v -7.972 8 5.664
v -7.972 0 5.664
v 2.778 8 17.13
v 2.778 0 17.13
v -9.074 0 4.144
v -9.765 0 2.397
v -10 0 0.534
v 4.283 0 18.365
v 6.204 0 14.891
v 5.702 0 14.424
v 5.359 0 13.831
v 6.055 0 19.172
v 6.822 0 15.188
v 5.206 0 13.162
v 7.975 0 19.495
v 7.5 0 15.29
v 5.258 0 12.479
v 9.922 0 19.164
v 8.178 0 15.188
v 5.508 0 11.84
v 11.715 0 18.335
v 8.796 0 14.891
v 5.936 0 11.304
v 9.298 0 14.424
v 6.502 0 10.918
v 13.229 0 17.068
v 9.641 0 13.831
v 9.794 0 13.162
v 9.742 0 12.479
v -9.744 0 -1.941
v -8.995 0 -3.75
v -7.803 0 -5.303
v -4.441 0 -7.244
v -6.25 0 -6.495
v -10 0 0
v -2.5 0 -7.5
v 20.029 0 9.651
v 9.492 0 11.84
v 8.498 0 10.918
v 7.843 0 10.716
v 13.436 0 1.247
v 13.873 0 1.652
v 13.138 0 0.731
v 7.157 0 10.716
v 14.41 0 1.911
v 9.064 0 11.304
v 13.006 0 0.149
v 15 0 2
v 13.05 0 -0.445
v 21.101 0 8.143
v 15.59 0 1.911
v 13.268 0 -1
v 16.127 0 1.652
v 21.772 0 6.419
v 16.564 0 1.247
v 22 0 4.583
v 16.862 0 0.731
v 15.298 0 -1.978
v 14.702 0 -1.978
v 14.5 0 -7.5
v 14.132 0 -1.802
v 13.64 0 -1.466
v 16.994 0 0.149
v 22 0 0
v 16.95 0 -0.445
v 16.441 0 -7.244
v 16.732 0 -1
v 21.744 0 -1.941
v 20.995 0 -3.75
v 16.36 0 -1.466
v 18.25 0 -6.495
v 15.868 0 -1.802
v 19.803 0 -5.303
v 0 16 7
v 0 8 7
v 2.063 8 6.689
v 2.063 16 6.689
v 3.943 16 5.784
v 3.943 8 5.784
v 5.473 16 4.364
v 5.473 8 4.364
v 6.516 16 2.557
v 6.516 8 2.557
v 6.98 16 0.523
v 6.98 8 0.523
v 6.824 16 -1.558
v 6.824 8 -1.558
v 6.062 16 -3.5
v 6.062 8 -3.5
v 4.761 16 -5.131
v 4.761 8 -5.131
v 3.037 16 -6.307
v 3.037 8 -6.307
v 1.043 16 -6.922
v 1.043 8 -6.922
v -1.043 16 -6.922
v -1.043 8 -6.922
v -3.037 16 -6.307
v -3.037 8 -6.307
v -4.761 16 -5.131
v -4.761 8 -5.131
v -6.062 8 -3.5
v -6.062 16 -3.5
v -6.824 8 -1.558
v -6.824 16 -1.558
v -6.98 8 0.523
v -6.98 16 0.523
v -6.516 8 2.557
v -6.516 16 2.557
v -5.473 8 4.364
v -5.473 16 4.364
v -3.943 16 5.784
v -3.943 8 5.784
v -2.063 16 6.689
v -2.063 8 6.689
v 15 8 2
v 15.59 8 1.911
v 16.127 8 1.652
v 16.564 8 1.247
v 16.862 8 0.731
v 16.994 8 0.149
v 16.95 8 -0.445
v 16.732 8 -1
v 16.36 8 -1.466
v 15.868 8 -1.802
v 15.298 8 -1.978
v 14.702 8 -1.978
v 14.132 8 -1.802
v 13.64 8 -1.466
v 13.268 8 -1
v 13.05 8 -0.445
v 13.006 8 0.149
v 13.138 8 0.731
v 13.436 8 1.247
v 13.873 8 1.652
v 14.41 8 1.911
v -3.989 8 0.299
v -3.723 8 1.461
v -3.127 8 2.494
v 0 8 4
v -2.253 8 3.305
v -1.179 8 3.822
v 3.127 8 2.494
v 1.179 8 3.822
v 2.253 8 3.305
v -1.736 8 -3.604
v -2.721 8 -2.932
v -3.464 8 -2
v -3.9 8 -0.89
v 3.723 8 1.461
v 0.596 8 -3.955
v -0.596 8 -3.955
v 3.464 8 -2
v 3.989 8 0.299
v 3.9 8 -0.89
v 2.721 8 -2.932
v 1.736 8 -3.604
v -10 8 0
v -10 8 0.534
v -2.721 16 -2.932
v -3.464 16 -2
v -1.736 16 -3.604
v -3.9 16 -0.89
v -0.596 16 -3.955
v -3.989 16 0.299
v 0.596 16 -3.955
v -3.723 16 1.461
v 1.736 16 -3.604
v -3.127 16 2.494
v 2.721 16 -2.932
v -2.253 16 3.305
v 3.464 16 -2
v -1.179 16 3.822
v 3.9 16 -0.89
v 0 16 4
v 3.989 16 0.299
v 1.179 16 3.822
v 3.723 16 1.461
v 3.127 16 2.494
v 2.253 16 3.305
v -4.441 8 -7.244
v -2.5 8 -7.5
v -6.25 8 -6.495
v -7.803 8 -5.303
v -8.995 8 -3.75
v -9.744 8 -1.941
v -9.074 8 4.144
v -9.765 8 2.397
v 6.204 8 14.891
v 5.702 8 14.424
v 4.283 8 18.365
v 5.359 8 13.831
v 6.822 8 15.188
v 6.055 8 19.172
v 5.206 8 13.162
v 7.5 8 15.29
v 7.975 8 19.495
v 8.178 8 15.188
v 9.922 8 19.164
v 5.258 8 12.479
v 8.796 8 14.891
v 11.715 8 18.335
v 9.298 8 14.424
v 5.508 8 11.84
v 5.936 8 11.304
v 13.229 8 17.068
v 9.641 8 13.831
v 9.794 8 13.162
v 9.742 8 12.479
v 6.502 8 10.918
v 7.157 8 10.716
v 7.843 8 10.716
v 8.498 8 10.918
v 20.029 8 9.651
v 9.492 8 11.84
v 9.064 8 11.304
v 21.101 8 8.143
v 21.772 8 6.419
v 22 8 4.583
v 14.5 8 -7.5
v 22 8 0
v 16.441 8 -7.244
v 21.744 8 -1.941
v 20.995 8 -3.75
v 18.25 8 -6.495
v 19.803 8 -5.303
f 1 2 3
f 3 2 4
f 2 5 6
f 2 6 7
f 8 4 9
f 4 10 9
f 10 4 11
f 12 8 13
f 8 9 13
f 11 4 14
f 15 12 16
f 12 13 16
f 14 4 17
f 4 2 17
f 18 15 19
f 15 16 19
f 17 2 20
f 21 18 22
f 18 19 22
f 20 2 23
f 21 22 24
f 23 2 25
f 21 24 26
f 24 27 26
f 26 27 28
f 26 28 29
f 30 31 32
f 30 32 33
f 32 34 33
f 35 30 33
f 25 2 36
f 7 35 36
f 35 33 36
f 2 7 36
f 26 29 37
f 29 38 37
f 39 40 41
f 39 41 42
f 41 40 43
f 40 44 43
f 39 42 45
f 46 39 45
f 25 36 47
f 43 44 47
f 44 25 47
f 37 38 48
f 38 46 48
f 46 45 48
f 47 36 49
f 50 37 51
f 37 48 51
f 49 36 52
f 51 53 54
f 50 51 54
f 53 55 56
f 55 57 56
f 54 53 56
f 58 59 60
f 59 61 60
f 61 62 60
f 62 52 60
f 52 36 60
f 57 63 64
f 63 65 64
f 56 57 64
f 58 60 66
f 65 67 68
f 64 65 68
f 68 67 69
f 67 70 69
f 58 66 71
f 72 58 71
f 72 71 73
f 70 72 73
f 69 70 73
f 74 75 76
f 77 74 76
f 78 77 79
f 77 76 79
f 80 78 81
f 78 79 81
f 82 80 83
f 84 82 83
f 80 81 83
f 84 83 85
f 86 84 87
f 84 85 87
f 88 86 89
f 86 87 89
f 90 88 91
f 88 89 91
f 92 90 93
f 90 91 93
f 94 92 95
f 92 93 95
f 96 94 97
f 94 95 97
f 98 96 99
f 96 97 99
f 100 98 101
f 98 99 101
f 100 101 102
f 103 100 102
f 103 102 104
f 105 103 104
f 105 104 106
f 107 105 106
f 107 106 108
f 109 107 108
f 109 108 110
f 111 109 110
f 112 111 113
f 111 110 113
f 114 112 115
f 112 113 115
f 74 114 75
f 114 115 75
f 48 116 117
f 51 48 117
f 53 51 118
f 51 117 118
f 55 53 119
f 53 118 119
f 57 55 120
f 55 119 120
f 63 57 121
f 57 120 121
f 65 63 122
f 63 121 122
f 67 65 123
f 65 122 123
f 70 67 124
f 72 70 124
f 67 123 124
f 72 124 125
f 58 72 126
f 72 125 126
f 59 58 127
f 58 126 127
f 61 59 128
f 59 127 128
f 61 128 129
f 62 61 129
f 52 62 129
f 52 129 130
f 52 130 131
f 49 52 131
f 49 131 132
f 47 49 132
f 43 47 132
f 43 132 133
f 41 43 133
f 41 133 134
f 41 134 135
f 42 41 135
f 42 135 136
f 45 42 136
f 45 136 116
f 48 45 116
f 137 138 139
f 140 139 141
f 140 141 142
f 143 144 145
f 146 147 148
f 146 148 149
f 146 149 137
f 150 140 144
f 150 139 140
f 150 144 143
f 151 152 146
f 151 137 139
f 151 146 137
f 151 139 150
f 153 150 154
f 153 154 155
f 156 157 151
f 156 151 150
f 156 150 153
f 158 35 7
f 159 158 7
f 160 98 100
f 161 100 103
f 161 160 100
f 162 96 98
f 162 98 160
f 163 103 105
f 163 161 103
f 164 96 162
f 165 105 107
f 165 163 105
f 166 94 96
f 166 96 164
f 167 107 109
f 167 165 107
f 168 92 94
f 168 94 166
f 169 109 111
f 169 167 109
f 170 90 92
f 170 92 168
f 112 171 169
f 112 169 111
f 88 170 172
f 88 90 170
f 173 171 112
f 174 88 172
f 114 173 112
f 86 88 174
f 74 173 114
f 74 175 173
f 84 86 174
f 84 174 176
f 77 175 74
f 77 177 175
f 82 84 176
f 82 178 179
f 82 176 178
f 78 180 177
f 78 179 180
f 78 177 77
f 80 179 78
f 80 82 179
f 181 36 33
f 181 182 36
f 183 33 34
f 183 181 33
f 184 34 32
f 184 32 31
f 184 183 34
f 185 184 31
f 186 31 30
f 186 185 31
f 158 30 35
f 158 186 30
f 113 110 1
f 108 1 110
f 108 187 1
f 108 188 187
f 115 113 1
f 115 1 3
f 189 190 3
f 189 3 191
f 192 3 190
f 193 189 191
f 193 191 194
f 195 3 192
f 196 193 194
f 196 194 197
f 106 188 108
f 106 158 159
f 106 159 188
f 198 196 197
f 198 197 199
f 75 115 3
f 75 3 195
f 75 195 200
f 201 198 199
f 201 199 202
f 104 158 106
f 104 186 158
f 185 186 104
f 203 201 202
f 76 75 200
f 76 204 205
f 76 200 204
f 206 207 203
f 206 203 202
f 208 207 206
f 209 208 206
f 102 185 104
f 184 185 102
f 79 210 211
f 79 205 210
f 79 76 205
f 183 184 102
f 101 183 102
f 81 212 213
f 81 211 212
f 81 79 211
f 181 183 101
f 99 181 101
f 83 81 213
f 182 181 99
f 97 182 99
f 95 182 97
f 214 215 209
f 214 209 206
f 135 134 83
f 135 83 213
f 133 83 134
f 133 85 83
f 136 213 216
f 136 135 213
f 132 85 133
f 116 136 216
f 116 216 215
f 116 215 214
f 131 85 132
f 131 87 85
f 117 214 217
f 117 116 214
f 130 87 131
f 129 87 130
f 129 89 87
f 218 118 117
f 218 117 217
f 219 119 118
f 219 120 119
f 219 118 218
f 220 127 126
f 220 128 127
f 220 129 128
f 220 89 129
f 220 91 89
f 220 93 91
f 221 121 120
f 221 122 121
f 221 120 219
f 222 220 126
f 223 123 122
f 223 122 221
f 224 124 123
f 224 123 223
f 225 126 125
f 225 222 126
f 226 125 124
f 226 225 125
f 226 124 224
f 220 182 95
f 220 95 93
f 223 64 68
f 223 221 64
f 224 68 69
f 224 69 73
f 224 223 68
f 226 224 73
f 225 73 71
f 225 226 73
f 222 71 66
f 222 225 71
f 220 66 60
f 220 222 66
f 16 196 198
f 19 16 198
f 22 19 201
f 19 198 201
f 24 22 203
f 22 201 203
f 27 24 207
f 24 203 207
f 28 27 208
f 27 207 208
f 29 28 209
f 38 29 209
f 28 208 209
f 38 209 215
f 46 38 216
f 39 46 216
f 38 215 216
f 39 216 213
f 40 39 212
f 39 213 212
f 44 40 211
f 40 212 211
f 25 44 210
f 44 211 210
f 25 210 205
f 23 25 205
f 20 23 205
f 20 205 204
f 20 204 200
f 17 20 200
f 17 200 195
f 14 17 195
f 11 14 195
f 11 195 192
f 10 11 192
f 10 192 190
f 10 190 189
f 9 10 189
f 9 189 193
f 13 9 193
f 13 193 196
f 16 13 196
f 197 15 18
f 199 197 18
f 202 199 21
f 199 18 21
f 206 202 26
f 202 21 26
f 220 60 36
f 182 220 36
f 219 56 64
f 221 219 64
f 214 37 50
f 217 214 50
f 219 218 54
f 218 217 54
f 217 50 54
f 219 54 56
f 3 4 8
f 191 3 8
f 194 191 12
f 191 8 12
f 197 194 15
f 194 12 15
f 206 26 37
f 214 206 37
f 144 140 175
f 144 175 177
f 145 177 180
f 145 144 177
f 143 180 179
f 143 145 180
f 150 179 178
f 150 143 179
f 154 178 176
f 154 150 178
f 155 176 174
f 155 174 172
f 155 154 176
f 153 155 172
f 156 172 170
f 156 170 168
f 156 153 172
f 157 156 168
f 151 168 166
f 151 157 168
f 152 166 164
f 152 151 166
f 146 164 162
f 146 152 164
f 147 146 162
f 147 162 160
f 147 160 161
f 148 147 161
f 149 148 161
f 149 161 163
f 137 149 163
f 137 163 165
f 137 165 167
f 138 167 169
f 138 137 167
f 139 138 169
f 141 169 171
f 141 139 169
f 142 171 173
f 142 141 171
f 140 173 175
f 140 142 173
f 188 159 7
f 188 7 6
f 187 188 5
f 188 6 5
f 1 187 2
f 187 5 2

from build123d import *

# Parameters (mm, degrees)
BOSS_EXTRU_1_DEPTH      = 8
CONG_1_R                = 7.5
ENL_V_MAT_EXTRU_1_REACH = 32.467
ESQUISSE2_R             = 2
ESQUISSE2_R_2           = 2.3
ESQUISSE3_R             = 7
ESQUISSE3_R_2           = 4
BOSS_EXTRU_2_DEPTH      = 8
CONG_2_R                = 7.5


with BuildPart() as part:
    # Esquisse1 → Boss.-Extru.1 (new body)
    with BuildSketch(Plane(origin=(0, 0, 0), x_dir=(1, 0, 0), z_dir=(0, 1, 0))):
        Polygon((-10, -3.5), (5, -19.5), (11, -19.5), (22, -7.5), (22, 7.5), (-10, 7.5), align=None)
    extrude(amount=BOSS_EXTRU_1_DEPTH)

    # Congé1
    cong_1_edges = [part.edges().sort_by_distance(p)[0] for p in [
        (-10, 4, -7.5),
        (22, 4, -7.5),
    ]]
    fillet(cong_1_edges, radius=CONG_1_R)

    # Esquisse2 → Enlèv. mat.-Extru.1 (cut, up to next)
    with BuildSketch(Plane(origin=(0, 8, 0), x_dir=(1, 0, 0), z_dir=(0, 1, 0)), mode=Mode.PRIVATE) as enl_v_mat_extru_1_sk1:
        with Locations(Location((15, 0, 0), (0, 0, 270))):
            Circle(ESQUISSE2_R)
    enl_v_mat_extru_1_tool1 = extrude(enl_v_mat_extru_1_sk1.sketch, amount=-ENL_V_MAT_EXTRU_1_REACH, mode=Mode.PRIVATE) & part.part
    # Esquisse2 → Enlèv. mat.-Extru.1 (cut, up to next)
    with BuildSketch(Plane(origin=(0, 8, 0), x_dir=(1, 0, 0), z_dir=(0, 1, 0)), mode=Mode.PRIVATE) as enl_v_mat_extru_1_sk2:
        with Locations(Location((7.5, -12.990381057, 0), (0, 0, 270))):
            Circle(ESQUISSE2_R_2)
    enl_v_mat_extru_1_tool2 = extrude(enl_v_mat_extru_1_sk2.sketch, amount=-ENL_V_MAT_EXTRU_1_REACH, mode=Mode.PRIVATE) & part.part
    add(enl_v_mat_extru_1_tool1.solids().sort_by_distance((15, 8, 0))[0], mode=Mode.SUBTRACT)
    add(enl_v_mat_extru_1_tool2.solids().sort_by_distance((7.5, 8, 12.990381))[0], mode=Mode.SUBTRACT)

    # Esquisse3 → Boss.-Extru.2 (add)
    with BuildSketch(Plane(origin=(0, 8, 0), x_dir=(1, 0, 0), z_dir=(0, 1, 0))):
        with Locations(Location((0, 0, 0), (0, 0, 270))):
            Circle(ESQUISSE3_R)
        with Locations(Location((0, 0, 0), (0, 0, 270))):
            Circle(ESQUISSE3_R_2, mode=Mode.SUBTRACT)
    extrude(amount=BOSS_EXTRU_2_DEPTH)

    # Congé2
    # the kernel refuses this fillet: 7.5 mm, written as the material it takes off along each edge
    with BuildSketch(Plane(origin=(22, -7.293444198, 7.5), x_dir=(-0.6757246285173467, 0, 0.7371541402007411), z_dir=(0, 1, 0))) as cong_2_piece_1:
        with BuildLine():
            CenterArc((CONG_2_R * 0.388983690555, -CONG_2_R), CONG_2_R, 90, 42.510447078)
            Line((-CONG_2_R * 0.286740937963, -CONG_2_R * 0.262845859799), (0, 0))
            Line((0, 0), (CONG_2_R * 0.388983690555, 0))
        make_face()
    extrude(amount=22.586888396, mode=Mode.SUBTRACT)
    with BuildSketch(Plane(origin=(11, -8.248157181, 19.5), x_dir=(-1, 0, 0), z_dir=(0, 1, 0))) as cong_2_piece_2:
        with BuildLine():
            CenterArc((CONG_2_R * 0.439901716342, -CONG_2_R), CONG_2_R, 90, 47.489552922)
            Line((-CONG_2_R * 0.297252423859, -CONG_2_R * 0.324275371483), (0, 0))
            Line((0, 0), (CONG_2_R * 0.439901716342, 0))
        make_face()
    extrude(amount=24.496314363, mode=Mode.SUBTRACT)
    with BuildSketch(Plane(origin=(5, -8.123100234, 19.5), x_dir=(-0.6839411288813303, 0, -0.7295372041400847), z_dir=(0, 1, 0))) as cong_2_piece_3:
        with BuildLine():
            CenterArc((CONG_2_R * 0.433232012466, -CONG_2_R), CONG_2_R, 90, 46.847610266)
            Line((-CONG_2_R * 0.296305191674, -CONG_2_R * 0.316058871119), (0, 0))
            Line((0, 0), (CONG_2_R * 0.433232012466, 0))
        make_face()
    extrude(amount=24.246200467, mode=Mode.SUBTRACT)
    with BuildSketch(Plane(origin=(-10, -7.414640249, 3.5), x_dir=(0, 0, -1), z_dir=(0, 1, 0))) as cong_2_piece_4:
        with BuildLine():
            CenterArc((CONG_2_R * 0.395447479964, -CONG_2_R), CONG_2_R, 90, 43.152389734)
            Line((-CONG_2_R * 0.288493648917, -CONG_2_R * 0.27046279586), (0, 0))
            Line((0, 0), (CONG_2_R * 0.395447479964, 0))
        make_face()
    extrude(amount=22.829280499, mode=Mode.SUBTRACT)


solid = part.part
